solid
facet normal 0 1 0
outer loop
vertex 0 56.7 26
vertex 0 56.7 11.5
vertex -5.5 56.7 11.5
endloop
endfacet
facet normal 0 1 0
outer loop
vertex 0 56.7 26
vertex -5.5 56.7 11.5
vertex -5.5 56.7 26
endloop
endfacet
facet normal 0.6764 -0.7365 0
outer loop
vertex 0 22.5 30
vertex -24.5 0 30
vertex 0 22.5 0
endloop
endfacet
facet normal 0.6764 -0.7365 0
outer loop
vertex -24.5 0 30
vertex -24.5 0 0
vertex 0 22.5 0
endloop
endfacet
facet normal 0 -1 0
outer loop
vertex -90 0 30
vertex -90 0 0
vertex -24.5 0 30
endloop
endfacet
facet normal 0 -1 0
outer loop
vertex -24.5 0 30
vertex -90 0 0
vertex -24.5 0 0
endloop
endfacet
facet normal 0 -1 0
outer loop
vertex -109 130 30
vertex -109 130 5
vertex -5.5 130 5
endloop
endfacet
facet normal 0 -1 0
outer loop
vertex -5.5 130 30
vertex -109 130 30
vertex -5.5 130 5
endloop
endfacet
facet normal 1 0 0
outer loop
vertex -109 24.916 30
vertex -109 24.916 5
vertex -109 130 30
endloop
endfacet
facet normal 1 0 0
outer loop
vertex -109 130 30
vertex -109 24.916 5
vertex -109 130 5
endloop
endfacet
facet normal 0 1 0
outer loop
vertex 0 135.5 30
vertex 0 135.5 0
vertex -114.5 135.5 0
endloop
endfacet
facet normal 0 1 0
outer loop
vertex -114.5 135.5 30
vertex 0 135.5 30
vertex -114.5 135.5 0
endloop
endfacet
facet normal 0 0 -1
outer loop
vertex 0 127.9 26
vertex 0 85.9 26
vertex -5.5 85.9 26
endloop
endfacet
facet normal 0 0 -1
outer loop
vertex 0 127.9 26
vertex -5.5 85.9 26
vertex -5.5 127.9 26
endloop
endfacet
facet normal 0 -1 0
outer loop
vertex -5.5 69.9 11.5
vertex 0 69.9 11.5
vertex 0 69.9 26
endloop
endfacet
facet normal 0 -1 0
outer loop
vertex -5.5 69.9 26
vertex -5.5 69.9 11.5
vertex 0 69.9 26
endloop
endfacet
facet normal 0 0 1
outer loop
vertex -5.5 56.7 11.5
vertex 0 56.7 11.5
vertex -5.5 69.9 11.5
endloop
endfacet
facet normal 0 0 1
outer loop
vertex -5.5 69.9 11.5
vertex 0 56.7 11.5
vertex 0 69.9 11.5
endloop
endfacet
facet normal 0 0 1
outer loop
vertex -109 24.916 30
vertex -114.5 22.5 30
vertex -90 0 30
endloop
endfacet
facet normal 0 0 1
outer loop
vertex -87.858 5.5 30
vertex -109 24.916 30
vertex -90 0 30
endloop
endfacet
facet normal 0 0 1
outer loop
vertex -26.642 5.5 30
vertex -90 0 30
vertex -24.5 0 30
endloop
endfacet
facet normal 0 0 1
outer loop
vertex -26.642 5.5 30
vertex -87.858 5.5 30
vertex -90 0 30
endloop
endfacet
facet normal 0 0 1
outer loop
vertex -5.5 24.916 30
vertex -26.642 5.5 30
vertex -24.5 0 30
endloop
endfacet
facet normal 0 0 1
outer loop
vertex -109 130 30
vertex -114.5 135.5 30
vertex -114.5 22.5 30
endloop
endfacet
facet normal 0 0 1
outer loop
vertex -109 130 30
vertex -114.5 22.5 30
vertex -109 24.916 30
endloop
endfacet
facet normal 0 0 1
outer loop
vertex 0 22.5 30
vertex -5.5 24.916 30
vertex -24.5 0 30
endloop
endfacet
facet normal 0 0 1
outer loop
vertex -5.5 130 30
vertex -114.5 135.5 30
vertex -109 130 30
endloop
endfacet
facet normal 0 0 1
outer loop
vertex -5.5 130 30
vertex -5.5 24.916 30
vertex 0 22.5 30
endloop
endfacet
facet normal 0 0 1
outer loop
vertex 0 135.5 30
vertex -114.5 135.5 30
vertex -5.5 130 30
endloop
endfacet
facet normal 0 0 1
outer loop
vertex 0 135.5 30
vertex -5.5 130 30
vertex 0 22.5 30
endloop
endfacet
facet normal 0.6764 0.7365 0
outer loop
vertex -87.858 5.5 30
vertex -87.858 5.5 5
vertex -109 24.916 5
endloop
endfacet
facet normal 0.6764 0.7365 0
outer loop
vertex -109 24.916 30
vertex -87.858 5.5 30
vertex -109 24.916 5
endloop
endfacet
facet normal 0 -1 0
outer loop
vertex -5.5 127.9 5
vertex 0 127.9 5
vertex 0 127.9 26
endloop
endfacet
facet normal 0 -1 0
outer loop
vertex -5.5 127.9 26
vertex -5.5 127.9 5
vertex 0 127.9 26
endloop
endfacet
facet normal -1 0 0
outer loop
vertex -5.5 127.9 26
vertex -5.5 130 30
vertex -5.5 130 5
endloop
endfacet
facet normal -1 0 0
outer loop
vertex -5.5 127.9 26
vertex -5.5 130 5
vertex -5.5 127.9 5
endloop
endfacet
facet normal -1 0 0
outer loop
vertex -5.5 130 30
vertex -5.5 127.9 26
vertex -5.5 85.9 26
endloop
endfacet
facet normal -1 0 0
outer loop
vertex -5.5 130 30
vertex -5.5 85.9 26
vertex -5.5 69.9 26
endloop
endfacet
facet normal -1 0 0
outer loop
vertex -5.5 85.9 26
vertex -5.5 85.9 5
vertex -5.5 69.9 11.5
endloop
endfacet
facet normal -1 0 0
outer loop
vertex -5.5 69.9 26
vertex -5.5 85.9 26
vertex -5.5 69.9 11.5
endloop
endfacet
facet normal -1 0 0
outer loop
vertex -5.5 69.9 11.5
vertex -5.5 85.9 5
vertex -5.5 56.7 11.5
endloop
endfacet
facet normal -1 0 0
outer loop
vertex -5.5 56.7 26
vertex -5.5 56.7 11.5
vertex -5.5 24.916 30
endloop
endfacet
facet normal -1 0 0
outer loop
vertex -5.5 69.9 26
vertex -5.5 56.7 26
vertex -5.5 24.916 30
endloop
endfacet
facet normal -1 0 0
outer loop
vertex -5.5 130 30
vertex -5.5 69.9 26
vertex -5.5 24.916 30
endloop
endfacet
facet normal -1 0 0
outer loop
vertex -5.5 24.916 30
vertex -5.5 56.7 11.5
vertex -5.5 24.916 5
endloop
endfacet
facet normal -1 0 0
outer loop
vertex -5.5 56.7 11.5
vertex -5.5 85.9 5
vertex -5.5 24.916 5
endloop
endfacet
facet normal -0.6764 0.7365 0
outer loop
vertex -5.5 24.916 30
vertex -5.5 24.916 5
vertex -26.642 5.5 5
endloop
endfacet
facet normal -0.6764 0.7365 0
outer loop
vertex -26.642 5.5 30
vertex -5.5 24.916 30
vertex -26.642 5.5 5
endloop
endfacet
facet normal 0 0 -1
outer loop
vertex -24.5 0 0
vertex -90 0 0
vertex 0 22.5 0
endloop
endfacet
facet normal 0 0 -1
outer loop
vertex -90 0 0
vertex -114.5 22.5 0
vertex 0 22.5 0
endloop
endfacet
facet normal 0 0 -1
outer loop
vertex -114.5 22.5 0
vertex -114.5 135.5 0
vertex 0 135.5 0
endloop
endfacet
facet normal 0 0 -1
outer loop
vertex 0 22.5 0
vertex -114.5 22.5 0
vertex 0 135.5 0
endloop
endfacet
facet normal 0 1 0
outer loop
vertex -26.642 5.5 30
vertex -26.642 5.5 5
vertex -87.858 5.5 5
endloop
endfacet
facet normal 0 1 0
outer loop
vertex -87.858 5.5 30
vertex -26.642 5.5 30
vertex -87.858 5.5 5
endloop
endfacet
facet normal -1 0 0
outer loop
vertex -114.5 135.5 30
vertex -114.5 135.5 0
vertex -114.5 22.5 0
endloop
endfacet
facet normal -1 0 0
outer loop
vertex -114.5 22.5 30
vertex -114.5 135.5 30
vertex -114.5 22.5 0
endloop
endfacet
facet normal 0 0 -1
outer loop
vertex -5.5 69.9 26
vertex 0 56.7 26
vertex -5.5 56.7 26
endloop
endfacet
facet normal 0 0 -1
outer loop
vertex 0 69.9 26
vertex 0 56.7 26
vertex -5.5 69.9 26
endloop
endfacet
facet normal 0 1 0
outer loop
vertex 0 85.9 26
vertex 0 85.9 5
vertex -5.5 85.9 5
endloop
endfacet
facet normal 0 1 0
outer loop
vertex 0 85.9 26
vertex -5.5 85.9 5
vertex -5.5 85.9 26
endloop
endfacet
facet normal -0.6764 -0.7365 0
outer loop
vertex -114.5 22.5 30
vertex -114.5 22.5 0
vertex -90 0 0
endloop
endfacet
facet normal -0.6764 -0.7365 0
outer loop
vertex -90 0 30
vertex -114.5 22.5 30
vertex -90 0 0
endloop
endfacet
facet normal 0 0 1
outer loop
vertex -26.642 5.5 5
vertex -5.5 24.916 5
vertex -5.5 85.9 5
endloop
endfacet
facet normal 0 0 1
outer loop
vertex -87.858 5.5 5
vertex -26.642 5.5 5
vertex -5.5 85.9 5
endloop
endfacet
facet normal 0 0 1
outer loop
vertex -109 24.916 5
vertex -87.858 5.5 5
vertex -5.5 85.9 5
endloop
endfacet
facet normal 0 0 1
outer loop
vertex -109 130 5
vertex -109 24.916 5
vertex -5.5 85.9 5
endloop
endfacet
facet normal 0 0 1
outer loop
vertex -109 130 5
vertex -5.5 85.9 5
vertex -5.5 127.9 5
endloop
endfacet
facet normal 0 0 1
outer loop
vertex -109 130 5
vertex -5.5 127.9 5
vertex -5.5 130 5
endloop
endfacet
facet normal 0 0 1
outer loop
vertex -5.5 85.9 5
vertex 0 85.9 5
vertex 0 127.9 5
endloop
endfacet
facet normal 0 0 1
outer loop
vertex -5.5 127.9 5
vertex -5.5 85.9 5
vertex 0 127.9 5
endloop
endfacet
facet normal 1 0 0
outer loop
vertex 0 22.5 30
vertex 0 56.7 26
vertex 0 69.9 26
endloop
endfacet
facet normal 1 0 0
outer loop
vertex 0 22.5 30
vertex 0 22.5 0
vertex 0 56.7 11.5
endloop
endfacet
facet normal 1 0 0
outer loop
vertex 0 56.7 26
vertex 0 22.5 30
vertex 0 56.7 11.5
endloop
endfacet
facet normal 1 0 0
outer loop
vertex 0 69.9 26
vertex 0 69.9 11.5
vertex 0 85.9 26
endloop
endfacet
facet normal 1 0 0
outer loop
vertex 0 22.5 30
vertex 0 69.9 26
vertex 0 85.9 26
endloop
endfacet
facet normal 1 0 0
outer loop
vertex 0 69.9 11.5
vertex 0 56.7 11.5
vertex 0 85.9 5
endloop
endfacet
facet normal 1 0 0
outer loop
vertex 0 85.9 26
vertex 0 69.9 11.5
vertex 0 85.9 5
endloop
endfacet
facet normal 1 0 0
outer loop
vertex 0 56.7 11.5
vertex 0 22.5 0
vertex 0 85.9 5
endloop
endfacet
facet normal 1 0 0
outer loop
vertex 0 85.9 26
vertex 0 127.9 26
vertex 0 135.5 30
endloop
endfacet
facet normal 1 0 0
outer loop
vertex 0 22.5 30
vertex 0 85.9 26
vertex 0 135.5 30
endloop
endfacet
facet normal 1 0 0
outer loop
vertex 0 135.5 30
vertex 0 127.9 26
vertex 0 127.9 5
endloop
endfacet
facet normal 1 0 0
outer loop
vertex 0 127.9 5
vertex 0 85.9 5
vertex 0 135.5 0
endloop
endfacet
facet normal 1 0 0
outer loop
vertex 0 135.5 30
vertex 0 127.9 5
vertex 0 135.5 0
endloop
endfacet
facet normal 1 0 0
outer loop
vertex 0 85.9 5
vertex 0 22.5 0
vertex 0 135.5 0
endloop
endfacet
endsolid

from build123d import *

# Parameters (mm, degrees)
F1_DEPTH = 5
F3_DEPTH = 25
F4_W     = 42
F4_H     = 21
F4_W_2   = 13.2
F4_H_2   = 14.5
F5_DEPTH = 5.5


with BuildPart() as f1:
    # F0 (on Top) → F1 (new body)
    with BuildSketch(Plane.XY):
        Polygon((-90, 0), (-24.5, 0), (0, 22.5), (0, 135.5), (-114.5, 135.5), (-114.5, 22.5), align=None)
    extrude(amount=F1_DEPTH)

    # F2 (on face) → F3 (join)
    with BuildSketch(Plane.XY.offset(5)):
        Polygon((-114.5, 22.5), (-90, 0), (-24.5, 0), (0, 22.5), (0, 135.5), (-114.5, 135.5), align=None)
        Polygon((-5.5, 24.916429), (-26.642334, 5.5), (-87.857666, 5.5), (-109, 24.916429), (-109, 130), (-5.5, 130), align=None, mode=Mode.SUBTRACT)
    extrude(amount=F3_DEPTH)

    # F4 (on face) → F5 (cut, through all)
    with BuildSketch(Plane.YZ):
        with Locations((106.9, 15.5)):
            Rectangle(F4_W, F4_H)
        with Locations((63.3, 18.75)):
            Rectangle(F4_W_2, F4_H_2)
    extrude(amount=-F5_DEPTH, mode=Mode.SUBTRACT)


solid = f1.part
